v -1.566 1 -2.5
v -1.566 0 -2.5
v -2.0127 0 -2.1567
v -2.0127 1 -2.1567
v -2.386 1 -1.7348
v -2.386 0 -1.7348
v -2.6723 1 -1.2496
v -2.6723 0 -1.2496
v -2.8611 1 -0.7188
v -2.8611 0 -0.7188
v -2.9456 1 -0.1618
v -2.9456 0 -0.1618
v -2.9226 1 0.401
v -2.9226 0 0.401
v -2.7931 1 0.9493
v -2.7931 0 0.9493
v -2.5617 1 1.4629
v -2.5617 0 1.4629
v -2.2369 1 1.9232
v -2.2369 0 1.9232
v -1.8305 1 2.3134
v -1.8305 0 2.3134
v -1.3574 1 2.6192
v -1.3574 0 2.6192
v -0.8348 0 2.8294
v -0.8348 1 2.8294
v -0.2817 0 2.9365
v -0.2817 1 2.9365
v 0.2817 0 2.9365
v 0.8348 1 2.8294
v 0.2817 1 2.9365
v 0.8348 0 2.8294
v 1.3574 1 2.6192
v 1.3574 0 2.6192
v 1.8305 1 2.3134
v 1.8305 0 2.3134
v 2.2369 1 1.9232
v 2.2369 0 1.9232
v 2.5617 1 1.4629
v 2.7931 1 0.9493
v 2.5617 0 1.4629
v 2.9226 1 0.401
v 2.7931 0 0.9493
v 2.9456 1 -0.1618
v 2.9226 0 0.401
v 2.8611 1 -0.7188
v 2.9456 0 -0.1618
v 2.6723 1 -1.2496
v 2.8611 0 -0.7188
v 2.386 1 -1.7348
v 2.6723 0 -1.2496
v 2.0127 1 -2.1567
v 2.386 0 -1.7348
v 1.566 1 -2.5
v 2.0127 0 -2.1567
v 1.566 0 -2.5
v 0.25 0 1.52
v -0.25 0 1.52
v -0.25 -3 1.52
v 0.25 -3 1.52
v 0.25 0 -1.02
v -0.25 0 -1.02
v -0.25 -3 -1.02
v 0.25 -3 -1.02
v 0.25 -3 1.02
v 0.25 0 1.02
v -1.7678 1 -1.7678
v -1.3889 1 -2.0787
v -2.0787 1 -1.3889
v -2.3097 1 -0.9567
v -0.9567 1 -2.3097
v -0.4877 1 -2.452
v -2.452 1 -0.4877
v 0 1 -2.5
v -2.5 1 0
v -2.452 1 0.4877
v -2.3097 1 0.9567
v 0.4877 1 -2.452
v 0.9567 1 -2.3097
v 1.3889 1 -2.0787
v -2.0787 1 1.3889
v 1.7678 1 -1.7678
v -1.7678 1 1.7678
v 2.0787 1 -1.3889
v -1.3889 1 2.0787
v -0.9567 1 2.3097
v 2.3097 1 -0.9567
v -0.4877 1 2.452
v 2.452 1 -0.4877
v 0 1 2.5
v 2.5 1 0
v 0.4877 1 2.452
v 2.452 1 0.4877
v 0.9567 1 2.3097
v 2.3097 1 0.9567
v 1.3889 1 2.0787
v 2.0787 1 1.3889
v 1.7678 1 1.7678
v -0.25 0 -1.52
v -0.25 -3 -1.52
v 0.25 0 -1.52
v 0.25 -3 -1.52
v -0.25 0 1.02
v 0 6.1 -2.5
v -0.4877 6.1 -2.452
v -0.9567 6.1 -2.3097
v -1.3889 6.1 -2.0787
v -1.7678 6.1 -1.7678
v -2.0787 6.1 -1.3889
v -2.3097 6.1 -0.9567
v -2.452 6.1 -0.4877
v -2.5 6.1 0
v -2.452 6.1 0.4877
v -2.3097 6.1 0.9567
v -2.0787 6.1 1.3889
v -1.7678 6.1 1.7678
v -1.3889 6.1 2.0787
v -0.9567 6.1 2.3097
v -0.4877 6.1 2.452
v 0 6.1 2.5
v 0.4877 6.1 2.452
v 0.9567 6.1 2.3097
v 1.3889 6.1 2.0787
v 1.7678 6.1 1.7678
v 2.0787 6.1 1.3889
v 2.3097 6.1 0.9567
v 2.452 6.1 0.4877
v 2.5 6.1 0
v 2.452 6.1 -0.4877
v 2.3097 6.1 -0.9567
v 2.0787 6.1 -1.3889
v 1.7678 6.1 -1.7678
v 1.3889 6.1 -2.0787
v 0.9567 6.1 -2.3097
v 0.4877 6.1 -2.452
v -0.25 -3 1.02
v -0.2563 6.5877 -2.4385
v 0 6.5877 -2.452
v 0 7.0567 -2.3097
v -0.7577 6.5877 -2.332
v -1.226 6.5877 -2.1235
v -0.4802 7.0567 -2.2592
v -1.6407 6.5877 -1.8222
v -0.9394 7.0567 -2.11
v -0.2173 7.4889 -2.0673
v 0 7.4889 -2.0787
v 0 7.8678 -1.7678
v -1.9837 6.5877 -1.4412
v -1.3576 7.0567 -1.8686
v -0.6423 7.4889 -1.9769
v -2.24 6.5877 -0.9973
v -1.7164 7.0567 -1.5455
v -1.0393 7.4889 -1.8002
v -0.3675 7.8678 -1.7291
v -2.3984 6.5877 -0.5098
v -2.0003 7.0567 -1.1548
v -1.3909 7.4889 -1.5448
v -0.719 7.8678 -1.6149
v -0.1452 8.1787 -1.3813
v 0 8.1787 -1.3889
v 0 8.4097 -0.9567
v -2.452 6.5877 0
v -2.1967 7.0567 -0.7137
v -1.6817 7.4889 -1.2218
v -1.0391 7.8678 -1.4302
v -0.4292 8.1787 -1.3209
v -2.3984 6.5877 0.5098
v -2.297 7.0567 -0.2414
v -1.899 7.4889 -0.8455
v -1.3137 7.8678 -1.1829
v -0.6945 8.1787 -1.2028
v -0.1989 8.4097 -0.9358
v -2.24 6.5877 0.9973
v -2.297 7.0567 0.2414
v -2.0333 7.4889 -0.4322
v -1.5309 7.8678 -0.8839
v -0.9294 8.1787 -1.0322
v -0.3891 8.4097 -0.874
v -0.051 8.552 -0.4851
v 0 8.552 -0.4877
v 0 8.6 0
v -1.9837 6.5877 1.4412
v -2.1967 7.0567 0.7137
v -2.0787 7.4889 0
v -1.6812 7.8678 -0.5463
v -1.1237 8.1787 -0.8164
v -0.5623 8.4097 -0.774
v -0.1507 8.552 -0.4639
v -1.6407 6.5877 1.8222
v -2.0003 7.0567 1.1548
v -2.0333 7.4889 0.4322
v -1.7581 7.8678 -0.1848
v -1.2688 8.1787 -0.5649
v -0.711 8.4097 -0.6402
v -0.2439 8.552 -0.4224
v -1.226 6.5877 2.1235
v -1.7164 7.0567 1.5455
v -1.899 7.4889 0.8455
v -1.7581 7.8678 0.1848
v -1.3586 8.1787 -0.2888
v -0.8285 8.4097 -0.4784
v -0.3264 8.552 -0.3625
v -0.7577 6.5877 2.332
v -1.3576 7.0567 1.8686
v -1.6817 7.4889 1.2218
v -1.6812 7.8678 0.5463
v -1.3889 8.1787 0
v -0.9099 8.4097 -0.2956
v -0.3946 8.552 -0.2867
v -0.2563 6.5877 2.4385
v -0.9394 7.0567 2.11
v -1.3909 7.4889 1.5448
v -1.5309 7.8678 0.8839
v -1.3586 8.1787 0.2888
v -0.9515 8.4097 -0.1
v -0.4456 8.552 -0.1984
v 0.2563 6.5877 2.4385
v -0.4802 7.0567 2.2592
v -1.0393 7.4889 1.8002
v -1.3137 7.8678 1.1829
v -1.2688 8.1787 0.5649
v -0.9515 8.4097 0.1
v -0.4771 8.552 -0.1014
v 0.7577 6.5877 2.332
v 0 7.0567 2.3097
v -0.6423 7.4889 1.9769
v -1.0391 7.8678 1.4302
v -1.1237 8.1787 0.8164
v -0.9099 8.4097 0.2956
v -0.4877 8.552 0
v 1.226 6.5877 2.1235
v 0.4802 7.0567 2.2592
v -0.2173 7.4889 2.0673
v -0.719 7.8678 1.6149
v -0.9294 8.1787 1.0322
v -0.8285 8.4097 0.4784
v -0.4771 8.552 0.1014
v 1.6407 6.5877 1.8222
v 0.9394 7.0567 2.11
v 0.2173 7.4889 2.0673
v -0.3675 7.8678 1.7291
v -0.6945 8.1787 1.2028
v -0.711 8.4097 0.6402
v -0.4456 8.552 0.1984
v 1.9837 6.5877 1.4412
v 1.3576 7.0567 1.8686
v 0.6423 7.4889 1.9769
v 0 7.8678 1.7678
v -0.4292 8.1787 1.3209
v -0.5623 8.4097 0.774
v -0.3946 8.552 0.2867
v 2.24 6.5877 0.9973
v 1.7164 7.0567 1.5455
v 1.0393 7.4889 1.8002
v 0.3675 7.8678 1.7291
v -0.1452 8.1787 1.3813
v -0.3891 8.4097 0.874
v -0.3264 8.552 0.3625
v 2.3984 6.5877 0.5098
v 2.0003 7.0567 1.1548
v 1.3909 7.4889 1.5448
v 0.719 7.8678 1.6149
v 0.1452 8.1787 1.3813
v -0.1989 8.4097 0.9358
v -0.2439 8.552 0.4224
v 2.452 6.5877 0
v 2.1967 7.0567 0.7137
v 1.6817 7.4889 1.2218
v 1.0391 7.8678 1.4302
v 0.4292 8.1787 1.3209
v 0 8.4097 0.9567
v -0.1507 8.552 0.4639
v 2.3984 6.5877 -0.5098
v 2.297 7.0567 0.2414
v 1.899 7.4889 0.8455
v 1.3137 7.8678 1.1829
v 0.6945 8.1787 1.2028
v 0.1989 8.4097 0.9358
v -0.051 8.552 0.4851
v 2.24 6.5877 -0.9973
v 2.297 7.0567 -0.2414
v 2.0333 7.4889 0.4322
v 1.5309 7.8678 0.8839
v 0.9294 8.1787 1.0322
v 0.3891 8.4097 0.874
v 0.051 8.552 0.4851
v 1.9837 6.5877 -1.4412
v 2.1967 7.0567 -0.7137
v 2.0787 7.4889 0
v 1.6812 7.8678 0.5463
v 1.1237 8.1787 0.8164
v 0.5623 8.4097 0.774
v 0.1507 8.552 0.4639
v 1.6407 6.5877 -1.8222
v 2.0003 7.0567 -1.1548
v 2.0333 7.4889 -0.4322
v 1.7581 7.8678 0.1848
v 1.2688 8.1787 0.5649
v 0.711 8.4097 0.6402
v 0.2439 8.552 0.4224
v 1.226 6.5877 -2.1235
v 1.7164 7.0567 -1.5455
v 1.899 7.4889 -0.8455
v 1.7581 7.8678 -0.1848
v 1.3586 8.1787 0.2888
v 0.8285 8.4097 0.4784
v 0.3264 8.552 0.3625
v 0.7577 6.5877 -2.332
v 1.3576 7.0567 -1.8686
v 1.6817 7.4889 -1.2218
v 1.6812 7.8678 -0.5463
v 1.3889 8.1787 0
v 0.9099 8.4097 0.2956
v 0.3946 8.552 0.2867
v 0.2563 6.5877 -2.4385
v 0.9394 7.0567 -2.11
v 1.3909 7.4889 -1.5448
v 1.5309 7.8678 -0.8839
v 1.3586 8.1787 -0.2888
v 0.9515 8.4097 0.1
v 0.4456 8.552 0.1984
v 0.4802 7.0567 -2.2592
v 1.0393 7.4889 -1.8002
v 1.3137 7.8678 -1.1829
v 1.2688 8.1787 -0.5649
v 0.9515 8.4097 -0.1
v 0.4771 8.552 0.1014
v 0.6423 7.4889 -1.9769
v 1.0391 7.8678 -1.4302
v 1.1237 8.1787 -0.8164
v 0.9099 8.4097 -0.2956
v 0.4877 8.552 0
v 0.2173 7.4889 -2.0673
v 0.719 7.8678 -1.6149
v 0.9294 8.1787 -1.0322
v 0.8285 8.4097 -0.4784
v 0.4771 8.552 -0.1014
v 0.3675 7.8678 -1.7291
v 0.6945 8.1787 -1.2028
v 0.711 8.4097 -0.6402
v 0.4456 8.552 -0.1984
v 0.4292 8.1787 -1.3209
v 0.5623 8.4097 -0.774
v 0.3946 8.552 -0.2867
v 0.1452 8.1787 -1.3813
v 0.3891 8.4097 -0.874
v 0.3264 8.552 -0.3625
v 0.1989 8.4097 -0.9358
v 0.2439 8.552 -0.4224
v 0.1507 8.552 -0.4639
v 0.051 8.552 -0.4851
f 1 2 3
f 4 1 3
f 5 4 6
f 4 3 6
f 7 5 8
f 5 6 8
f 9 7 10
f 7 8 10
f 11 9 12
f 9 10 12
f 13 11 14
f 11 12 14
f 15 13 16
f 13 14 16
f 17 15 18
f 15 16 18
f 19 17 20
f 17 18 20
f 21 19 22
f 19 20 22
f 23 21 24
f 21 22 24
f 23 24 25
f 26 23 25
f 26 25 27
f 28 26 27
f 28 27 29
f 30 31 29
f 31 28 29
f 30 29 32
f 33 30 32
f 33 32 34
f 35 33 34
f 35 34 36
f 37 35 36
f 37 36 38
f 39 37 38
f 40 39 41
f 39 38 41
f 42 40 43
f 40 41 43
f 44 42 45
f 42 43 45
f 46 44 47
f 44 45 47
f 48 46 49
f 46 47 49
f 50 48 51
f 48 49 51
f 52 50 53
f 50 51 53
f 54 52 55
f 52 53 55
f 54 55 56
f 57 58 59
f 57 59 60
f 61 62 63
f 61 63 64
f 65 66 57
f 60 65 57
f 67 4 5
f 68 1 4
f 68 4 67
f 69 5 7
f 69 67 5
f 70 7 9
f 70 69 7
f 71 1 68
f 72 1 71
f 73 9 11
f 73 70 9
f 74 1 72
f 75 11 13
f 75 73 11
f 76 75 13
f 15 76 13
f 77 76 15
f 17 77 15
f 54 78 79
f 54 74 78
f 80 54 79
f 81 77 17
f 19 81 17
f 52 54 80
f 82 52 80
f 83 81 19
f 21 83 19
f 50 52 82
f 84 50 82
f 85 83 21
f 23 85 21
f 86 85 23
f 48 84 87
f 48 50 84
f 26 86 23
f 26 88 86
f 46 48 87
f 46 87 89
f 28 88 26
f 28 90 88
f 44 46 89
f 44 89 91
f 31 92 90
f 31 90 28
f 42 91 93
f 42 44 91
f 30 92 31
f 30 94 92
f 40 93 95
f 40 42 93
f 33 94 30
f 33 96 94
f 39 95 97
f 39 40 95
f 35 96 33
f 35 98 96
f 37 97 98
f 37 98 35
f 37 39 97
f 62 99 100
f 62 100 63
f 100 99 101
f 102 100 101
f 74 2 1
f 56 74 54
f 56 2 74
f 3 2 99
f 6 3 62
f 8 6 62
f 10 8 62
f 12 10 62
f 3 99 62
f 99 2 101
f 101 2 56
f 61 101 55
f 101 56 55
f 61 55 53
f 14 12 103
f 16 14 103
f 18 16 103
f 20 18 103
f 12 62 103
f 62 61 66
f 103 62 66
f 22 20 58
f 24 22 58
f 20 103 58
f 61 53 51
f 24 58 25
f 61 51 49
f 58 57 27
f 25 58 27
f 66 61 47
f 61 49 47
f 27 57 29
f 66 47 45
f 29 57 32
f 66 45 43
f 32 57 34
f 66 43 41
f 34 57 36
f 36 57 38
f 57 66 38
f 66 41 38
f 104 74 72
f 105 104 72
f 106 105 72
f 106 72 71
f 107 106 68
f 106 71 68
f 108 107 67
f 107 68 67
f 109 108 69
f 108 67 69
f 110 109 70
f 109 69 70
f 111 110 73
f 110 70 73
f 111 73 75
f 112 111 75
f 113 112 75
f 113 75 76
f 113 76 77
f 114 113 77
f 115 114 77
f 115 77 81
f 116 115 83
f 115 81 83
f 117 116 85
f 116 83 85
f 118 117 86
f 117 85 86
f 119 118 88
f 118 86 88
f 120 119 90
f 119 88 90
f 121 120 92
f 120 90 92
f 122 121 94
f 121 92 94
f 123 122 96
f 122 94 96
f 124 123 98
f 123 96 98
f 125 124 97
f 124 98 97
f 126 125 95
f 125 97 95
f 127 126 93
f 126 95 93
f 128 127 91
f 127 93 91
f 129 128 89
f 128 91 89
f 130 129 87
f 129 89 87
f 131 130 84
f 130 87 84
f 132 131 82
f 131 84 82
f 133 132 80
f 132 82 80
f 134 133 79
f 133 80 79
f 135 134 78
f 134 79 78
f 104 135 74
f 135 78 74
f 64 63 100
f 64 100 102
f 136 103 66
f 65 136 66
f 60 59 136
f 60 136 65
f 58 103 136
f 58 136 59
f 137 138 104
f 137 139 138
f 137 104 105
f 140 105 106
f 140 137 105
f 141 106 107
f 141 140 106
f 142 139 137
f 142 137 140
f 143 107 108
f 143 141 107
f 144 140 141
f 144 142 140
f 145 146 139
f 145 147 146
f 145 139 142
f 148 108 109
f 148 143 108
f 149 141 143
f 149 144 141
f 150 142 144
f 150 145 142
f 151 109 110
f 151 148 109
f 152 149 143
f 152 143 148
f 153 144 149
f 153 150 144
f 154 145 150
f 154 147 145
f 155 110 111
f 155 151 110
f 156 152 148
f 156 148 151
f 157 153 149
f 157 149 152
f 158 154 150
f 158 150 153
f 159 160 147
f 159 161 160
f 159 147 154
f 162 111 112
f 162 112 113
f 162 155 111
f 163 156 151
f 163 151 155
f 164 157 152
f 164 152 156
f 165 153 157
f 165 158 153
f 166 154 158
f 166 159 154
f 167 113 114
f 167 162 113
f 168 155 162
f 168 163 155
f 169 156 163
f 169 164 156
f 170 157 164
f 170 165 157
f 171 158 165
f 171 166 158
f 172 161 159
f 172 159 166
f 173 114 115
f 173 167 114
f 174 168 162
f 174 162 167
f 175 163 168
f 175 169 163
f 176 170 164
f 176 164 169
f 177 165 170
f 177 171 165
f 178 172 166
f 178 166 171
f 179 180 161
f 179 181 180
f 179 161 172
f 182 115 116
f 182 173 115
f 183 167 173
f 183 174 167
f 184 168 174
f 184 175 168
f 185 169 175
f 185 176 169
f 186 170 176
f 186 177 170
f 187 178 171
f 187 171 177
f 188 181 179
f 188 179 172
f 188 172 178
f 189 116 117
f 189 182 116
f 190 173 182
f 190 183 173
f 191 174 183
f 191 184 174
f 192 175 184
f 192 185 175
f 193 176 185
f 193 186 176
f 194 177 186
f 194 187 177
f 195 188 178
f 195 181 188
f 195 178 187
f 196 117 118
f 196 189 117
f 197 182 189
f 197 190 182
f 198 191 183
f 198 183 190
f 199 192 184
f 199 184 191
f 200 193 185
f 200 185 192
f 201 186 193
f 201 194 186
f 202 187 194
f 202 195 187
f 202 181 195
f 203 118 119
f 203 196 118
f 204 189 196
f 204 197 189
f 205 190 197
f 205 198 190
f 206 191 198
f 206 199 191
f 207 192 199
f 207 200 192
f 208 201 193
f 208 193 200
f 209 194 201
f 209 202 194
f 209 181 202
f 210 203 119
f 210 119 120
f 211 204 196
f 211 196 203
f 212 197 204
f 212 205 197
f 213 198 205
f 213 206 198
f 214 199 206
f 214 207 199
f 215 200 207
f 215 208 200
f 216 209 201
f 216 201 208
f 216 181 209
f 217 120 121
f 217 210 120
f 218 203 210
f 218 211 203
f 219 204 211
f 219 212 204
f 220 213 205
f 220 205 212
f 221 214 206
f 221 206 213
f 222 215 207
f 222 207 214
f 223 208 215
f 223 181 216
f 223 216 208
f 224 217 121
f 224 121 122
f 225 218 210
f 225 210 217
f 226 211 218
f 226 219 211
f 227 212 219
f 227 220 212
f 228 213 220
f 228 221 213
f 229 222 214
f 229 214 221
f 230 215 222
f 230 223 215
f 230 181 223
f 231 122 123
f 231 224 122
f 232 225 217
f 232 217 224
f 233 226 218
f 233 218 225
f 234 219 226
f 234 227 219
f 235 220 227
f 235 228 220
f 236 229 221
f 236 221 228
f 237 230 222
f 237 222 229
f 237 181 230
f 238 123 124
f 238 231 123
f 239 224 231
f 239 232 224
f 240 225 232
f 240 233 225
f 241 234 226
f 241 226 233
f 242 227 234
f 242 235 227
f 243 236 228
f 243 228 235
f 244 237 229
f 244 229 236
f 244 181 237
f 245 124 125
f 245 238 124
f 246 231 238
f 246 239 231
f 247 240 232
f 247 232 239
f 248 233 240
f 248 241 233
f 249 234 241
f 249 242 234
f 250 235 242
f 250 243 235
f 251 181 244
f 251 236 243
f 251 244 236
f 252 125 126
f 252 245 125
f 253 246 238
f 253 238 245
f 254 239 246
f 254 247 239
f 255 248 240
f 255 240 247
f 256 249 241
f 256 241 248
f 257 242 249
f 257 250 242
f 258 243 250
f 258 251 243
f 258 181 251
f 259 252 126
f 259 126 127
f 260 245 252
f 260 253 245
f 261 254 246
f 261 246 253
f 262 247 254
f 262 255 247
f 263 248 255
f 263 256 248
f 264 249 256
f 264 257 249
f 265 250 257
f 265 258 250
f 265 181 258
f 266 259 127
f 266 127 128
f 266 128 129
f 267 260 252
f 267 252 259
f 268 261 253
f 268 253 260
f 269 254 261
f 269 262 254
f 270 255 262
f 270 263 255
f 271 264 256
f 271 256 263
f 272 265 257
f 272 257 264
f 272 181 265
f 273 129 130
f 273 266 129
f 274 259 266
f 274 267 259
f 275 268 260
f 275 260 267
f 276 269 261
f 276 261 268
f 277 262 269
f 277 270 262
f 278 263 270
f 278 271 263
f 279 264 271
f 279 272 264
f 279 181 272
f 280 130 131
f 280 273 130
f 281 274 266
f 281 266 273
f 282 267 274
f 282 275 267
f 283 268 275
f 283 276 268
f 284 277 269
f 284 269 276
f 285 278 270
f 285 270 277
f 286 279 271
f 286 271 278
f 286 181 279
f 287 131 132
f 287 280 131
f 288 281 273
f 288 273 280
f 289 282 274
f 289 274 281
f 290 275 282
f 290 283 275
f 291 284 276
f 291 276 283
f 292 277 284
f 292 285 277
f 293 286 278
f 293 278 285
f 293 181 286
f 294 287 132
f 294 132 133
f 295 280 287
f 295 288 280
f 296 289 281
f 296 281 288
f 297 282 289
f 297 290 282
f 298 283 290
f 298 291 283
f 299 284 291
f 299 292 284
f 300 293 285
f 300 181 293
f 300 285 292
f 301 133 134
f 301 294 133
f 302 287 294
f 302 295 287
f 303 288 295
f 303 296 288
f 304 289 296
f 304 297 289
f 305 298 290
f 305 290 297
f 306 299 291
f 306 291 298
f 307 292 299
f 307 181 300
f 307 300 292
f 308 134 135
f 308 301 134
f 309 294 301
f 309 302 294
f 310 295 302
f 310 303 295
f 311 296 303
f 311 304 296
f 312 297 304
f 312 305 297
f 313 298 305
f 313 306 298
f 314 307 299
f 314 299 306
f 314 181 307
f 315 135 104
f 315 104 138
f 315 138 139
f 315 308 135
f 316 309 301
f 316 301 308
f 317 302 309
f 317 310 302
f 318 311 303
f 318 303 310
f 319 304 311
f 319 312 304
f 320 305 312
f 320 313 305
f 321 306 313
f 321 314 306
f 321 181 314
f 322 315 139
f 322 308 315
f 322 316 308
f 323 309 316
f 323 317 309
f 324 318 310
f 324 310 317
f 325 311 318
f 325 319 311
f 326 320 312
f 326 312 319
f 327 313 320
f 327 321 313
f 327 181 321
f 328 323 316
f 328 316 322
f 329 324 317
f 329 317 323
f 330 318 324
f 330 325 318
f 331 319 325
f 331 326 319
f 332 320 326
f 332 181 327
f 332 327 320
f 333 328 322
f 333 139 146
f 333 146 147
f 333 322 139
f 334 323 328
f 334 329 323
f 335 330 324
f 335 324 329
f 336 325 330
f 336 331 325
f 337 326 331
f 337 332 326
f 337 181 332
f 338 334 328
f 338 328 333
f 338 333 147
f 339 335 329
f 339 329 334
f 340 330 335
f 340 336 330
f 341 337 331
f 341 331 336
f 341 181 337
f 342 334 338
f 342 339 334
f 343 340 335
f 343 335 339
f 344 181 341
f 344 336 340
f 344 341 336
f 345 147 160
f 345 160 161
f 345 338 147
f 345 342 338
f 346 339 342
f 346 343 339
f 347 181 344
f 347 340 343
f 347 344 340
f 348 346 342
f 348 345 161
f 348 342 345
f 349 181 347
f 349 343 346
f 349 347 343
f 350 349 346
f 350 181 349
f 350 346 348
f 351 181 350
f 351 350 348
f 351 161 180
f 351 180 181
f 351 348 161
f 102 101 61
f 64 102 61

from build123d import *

# Parameters (mm, degrees)
SKETCH1_R           = 2.95
BOSS_EXTRUDE1_DEPTH = 1
SKETCH2_R           = 2.5
BOSS_EXTRUDE2_DEPTH = 7.6
CUT_EXTRUDE1_START  = -7.6
CUT_EXTRUDE1_DEPTH  = 7.6
FILLET1_R           = 2.5
SKETCH4_W           = 0.5
SKETCH4_H           = 0.5
BOSS_EXTRUDE3_DEPTH = 3


with BuildPart() as part:
    # Sketch1 → Boss-Extrude1 (new body)
    with BuildSketch(Plane(origin=(0, 0, 0), x_dir=(1, 0, 0), z_dir=(0, 1, 0))):
        with Locations(Location((0, 0, 0), (0, 0, 270))):
            Circle(SKETCH1_R)
    extrude(amount=BOSS_EXTRUDE1_DEPTH)

    # Sketch2 → Boss-Extrude2 (add)
    with BuildSketch(Plane(origin=(0, 1, 0), x_dir=(1, 0, 0), z_dir=(0, 1, 0))):
        with Locations(Location((0, 0, 0), (0, 0, 90))):
            Circle(SKETCH2_R)
    extrude(amount=BOSS_EXTRUDE2_DEPTH)

    # Sketch3 → Cut-Extrude1 (cut)
    with BuildSketch(Plane(origin=(0, 1, 0), x_dir=(1, 0, 0), z_dir=(0, 1, 0)).offset(CUT_EXTRUDE1_START)):
        with BuildLine():
            Line((-1.566045976, 2.5), (1.566045976, 2.5))
            ThreePointArc((1.566045976, 2.5), (0, 2.95), (-1.566045976, 2.5))
        make_face()
    extrude(amount=CUT_EXTRUDE1_DEPTH, mode=Mode.SUBTRACT)

    # Fillet1
    fillet1_edges = [part.edges().sort_by_distance(p)[0] for p in [
        (0, 8.6, 2.5),
    ]]
    fillet(fillet1_edges, radius=FILLET1_R)

    # Sketch4 → Boss-Extrude3 (add)
    with BuildSketch(Plane.XZ):
        with Locations((0, 1.27)):
            Rectangle(SKETCH4_W, SKETCH4_H)
        with Locations((0, -1.27)):
            Rectangle(SKETCH4_W, SKETCH4_H)
    extrude(amount=BOSS_EXTRUDE3_DEPTH)


solid = part.part
